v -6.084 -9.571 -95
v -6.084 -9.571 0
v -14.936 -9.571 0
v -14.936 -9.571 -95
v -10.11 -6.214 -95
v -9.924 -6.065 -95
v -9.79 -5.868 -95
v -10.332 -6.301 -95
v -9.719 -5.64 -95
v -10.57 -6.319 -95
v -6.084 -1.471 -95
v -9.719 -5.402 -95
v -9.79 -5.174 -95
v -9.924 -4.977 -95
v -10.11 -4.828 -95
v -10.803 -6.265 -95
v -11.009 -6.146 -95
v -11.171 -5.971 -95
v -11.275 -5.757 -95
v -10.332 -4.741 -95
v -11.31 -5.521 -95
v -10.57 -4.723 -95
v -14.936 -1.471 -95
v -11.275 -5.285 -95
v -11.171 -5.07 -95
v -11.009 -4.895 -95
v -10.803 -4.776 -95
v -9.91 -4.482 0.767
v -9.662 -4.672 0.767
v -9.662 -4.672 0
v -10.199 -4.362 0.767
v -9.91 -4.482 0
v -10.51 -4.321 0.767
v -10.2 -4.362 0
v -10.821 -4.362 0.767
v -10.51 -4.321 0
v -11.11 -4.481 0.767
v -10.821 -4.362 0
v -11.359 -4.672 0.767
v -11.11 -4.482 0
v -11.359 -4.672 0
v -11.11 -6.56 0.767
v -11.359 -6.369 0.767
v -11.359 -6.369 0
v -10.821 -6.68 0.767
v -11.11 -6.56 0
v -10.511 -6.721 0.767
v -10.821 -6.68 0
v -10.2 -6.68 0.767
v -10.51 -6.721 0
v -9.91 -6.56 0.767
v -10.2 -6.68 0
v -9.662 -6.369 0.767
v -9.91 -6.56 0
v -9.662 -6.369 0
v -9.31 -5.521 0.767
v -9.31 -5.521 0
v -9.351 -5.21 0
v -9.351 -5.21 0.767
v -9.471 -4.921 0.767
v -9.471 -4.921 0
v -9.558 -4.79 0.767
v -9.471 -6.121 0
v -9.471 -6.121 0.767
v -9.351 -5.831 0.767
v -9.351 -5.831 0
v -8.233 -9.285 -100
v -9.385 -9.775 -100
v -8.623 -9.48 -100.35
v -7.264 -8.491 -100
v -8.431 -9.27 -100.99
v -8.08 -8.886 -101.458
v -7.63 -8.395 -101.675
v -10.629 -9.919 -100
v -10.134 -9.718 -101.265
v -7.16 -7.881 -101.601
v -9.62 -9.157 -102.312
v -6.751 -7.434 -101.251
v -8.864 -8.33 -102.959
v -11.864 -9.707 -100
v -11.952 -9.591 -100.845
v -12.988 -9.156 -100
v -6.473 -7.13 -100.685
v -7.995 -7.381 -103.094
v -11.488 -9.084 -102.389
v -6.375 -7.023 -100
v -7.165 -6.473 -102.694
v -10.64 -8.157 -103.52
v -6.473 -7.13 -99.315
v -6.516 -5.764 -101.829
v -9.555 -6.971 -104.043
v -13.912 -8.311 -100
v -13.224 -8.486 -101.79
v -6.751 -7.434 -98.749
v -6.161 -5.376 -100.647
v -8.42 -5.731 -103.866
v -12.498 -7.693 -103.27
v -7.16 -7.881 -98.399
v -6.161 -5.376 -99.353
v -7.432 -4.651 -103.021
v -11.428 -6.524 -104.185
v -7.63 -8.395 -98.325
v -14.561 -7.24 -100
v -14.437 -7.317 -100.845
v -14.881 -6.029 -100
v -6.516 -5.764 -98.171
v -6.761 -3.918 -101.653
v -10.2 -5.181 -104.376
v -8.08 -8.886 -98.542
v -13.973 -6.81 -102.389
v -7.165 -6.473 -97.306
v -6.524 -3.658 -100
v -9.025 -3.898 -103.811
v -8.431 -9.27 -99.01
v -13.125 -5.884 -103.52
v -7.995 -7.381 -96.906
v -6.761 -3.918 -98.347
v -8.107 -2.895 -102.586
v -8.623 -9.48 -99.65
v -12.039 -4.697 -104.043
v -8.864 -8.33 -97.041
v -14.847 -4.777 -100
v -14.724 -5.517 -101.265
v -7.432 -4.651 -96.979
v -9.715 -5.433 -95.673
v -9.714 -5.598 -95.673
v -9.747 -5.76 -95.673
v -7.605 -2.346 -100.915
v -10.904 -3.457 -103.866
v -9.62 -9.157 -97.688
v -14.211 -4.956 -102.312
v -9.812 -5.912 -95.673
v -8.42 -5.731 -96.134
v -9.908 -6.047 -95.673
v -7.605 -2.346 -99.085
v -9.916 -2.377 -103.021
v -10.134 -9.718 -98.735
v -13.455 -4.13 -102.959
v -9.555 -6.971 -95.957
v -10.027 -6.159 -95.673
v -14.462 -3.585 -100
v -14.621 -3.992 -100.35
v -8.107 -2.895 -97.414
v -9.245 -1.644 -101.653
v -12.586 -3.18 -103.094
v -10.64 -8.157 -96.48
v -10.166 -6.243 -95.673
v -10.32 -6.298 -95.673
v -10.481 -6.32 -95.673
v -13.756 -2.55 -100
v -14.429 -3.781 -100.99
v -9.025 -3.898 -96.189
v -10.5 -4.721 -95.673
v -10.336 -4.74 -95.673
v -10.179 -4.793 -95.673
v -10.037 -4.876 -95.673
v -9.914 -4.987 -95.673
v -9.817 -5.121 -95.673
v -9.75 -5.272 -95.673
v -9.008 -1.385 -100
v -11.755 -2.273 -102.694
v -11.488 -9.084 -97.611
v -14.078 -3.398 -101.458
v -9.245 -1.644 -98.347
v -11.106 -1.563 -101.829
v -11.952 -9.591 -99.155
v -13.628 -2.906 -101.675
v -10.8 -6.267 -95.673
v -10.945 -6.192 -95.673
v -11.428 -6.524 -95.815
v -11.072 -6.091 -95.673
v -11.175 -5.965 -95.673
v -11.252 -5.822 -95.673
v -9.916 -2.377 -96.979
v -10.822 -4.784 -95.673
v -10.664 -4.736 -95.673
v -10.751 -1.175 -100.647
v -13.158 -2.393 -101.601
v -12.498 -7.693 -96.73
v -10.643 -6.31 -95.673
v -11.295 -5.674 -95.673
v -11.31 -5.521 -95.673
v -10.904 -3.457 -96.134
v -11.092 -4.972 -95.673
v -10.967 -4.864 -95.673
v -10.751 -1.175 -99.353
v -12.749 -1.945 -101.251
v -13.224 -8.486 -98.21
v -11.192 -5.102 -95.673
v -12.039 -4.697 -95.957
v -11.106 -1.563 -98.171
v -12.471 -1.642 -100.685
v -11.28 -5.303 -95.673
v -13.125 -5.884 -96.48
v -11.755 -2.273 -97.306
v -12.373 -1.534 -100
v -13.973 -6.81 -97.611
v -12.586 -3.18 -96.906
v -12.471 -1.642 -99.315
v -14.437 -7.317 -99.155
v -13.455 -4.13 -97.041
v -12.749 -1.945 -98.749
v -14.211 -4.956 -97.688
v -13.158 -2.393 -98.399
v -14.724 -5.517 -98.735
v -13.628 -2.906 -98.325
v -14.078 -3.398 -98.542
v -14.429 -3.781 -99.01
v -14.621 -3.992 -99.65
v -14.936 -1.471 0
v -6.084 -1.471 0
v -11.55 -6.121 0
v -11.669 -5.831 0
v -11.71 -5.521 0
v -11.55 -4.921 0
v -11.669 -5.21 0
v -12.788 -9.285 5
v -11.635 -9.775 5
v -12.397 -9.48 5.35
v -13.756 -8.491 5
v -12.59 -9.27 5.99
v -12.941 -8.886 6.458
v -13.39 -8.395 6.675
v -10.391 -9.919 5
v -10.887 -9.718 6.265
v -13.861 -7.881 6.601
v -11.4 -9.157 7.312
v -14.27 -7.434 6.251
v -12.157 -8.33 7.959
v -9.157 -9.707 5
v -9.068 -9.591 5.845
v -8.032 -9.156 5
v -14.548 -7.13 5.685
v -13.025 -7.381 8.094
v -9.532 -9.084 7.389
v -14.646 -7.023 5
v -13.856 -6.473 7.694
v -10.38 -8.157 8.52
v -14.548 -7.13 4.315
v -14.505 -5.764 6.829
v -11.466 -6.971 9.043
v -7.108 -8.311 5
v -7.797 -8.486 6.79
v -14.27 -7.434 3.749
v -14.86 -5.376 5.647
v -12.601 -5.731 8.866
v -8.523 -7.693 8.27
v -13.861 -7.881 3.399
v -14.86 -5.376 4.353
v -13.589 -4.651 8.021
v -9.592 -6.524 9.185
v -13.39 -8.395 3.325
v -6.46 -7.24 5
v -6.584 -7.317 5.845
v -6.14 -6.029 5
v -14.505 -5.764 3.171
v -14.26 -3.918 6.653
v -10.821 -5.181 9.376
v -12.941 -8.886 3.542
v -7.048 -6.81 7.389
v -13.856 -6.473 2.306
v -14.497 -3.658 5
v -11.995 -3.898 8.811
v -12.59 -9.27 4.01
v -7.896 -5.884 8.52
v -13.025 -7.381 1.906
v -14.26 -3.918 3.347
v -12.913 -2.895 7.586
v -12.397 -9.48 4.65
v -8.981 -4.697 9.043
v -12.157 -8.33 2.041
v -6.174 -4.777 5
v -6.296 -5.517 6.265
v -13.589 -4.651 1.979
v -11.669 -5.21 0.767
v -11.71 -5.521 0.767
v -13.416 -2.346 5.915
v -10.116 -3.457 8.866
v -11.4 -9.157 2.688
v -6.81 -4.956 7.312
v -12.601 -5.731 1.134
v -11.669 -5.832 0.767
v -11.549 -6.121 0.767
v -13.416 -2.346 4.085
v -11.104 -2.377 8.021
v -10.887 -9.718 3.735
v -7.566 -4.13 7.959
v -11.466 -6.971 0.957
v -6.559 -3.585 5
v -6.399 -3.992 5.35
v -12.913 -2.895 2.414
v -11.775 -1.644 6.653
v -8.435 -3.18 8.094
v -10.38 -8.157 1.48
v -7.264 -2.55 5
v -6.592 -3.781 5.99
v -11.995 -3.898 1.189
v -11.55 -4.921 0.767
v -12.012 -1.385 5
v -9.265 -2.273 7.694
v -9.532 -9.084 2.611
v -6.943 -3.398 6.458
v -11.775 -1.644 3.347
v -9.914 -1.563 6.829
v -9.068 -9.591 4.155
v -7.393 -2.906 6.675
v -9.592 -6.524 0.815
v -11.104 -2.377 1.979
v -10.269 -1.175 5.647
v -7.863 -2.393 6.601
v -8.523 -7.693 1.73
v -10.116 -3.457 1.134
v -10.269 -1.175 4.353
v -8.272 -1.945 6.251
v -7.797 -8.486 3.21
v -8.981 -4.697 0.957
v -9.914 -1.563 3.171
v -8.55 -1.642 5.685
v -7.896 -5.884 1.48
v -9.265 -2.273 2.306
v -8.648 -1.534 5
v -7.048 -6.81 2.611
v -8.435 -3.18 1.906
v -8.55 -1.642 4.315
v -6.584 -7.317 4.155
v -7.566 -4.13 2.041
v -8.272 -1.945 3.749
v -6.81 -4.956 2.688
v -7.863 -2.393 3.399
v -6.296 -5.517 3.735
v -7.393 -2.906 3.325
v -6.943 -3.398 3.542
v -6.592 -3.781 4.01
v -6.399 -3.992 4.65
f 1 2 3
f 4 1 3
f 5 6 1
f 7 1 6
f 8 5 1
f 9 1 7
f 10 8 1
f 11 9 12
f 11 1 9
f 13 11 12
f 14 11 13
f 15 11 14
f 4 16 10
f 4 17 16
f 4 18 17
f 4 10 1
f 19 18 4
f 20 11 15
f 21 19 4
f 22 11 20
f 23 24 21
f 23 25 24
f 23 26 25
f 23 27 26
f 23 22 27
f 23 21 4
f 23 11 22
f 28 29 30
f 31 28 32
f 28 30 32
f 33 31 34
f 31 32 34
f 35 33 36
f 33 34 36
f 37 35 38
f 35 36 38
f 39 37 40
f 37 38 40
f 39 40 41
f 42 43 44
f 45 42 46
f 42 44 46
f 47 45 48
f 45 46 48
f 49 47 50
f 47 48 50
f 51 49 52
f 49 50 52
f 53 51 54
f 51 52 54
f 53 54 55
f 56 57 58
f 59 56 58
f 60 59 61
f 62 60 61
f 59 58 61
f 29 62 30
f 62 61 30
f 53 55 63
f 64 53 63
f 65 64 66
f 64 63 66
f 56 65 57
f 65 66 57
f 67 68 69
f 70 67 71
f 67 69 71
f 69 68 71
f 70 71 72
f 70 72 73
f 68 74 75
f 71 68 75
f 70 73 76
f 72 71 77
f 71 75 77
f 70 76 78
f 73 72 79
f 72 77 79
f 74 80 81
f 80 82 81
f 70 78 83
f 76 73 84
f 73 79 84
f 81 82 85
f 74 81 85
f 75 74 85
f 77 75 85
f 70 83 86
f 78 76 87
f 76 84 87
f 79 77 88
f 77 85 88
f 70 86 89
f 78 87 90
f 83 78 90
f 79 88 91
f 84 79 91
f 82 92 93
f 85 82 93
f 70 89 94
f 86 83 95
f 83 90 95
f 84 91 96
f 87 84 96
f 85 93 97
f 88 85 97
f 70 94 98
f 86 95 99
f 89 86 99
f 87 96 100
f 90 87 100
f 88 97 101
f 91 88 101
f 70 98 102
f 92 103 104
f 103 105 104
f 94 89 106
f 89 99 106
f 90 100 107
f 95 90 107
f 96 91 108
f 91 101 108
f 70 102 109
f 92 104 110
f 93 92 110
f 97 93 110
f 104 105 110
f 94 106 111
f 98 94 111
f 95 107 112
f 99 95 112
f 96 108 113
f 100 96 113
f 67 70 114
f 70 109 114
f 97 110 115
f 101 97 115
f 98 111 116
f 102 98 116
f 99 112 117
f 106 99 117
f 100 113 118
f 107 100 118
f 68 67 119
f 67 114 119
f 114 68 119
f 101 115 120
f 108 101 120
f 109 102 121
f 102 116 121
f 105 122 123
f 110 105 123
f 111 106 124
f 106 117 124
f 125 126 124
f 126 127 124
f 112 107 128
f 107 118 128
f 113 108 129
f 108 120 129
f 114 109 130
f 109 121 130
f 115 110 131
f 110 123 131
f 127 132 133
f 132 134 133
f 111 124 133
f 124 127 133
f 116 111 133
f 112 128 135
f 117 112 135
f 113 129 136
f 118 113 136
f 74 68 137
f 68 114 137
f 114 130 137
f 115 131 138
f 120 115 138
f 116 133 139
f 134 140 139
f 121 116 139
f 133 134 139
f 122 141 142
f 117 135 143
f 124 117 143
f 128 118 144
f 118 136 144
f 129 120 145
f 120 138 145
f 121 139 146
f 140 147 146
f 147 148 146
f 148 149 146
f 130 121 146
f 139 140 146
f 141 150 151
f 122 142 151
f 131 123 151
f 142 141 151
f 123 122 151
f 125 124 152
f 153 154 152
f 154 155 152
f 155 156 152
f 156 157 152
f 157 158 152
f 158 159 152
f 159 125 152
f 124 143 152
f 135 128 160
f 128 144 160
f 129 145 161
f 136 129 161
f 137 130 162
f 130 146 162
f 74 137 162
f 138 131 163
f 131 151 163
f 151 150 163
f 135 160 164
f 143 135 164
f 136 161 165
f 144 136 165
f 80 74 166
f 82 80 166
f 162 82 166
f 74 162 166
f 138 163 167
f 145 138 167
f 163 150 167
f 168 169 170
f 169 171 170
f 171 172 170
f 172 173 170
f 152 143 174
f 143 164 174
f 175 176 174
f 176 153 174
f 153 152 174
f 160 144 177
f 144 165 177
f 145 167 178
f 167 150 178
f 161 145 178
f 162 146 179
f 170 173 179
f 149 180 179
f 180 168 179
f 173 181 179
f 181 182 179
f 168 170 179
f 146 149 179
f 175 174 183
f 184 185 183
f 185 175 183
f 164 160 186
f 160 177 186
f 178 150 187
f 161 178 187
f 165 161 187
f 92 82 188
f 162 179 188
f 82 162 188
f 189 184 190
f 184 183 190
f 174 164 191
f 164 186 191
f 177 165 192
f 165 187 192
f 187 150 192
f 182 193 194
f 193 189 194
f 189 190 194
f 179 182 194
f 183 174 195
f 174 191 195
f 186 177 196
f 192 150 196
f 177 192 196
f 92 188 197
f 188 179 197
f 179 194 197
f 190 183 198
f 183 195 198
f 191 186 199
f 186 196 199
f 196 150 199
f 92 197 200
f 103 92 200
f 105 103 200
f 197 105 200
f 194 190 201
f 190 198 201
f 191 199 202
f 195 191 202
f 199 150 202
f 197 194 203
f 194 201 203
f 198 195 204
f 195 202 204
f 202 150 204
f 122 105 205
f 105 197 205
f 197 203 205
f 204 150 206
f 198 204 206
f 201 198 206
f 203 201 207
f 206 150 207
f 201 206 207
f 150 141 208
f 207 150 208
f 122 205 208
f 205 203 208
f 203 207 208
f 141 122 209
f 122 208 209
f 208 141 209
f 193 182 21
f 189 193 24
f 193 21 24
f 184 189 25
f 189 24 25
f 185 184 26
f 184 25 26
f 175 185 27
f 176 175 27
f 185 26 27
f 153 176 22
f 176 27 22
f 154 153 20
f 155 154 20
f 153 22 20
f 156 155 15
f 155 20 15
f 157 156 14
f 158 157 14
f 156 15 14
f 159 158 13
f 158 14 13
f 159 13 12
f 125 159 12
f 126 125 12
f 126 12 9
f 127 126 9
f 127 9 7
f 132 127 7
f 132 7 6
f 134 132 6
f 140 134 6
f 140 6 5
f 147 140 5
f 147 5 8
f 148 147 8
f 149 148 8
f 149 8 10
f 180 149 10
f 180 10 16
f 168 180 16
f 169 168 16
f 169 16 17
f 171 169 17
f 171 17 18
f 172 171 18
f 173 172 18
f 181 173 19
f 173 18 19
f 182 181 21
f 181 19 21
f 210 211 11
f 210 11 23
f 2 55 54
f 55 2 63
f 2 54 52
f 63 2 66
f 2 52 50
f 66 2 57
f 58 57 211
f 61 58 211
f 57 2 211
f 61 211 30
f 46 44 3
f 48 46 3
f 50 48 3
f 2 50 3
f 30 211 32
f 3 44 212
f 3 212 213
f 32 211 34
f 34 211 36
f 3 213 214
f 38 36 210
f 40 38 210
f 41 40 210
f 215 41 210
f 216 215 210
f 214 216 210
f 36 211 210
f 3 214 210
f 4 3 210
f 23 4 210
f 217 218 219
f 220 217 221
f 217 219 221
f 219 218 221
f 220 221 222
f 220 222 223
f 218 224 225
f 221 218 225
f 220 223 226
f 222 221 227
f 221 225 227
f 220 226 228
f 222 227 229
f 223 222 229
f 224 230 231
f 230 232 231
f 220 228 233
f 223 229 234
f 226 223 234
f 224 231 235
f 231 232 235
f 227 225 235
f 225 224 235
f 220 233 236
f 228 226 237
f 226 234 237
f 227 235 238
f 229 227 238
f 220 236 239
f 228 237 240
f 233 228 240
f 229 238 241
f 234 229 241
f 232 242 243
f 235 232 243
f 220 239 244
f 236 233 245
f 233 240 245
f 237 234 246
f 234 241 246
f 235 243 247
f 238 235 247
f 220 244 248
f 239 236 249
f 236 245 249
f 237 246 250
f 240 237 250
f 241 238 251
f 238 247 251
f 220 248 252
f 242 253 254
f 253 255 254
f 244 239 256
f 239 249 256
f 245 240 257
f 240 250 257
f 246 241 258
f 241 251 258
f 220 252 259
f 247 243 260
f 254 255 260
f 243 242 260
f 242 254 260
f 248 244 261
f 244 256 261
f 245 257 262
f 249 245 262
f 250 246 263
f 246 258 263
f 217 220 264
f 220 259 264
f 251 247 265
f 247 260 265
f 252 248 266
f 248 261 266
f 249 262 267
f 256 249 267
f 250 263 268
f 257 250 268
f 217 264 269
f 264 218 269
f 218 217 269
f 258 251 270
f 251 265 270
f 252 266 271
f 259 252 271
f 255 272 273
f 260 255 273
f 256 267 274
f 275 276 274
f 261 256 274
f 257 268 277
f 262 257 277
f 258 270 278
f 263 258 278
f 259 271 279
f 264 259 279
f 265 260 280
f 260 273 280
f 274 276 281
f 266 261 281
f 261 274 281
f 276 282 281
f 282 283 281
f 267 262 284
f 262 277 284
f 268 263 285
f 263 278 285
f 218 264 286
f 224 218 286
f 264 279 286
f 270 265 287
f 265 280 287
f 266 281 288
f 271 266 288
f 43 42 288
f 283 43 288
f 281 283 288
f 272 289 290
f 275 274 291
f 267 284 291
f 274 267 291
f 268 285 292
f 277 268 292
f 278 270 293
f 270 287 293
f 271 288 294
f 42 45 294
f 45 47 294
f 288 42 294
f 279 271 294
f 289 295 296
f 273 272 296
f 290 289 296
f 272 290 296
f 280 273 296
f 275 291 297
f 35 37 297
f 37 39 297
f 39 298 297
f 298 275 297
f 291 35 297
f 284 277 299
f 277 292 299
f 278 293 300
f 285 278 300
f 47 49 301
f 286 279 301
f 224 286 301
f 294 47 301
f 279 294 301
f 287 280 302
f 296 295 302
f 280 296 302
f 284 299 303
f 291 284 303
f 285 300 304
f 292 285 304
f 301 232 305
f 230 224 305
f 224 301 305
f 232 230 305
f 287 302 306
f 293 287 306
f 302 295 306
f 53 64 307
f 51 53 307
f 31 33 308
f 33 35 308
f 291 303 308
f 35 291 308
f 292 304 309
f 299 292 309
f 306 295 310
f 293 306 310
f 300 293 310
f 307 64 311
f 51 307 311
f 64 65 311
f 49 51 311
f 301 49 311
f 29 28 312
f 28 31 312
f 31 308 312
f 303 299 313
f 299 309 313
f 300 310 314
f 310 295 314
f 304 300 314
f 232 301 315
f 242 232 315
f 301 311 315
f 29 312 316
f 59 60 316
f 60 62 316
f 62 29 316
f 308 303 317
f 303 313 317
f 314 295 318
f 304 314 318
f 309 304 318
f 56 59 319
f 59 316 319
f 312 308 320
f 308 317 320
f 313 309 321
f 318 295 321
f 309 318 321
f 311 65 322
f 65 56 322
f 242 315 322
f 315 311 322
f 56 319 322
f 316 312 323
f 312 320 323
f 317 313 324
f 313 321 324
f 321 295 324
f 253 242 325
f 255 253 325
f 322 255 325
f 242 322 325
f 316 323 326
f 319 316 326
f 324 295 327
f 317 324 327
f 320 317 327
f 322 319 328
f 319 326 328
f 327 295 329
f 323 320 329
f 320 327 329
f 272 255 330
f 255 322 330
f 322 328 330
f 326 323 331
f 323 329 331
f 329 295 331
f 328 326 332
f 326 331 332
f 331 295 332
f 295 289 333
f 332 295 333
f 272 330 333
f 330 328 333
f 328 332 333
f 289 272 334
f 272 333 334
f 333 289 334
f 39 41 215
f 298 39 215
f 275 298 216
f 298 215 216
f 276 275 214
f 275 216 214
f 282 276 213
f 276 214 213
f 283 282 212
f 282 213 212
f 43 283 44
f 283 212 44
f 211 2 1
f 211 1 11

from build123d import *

# Parameters (mm, degrees)
EXTRUDE_1_DEPTH = 5
SKETCH_3_W      = 8.851756477
SKETCH_3_H      = 8.100037161
EXTRUDE_2_DEPTH = 95
SKETCH_7_R      = 0.8
EXTRUDE_3_DEPTH = 5


with BuildPart() as part:
    # 草图1 → 凸台-拉伸1 (new body)
    with BuildSketch(Plane.XY):
        with BuildLine():
            ThreePointArc((-9.310291372, -5.5207396), (-9.401635933, -5.061519481), (-9.661763234, -4.672211463))
            Line((-9.661763234, -4.672211463), (-10.510291372, -5.5207396))
            Line((-10.510291372, -5.5207396), (-9.661763234, -6.369267738))
            ThreePointArc((-9.661763234, -6.369267738), (-9.401635933, -5.979959719), (-9.310291372, -5.5207396))
        make_face()
        with BuildLine():
            Line((-10.510291372, -5.5207396), (-9.661763234, -4.672211463))
            ThreePointArc((-9.661763234, -4.672211463), (-10.510291372, -4.3207396), (-11.358819509, -4.672211463))
            Line((-11.358819509, -4.672211463), (-10.510291372, -5.5207396))
        make_face()
        with BuildLine():
            Line((-9.661763234, -6.369267738), (-10.510291372, -5.5207396))
            Line((-10.510291372, -5.5207396), (-11.358819509, -6.369267738))
            ThreePointArc((-11.358819509, -6.369267738), (-10.510291372, -6.7207396), (-9.661763234, -6.369267738))
        make_face()
        with BuildLine():
            Line((-11.358819509, -6.369267738), (-10.510291372, -5.5207396))
            Line((-10.510291372, -5.5207396), (-11.358819509, -4.672211463))
            ThreePointArc((-11.358819509, -4.672211463), (-11.710291372, -5.5207396), (-11.358819509, -6.369267738))
        make_face()
    extrude(amount=EXTRUDE_1_DEPTH)

    # 草图2 → 旋转2 (revolve)
    with BuildSketch(Plane.XY.offset(5)):
        with BuildLine():
            Line((-7.264243744, -2.550356662), (-13.756338999, -8.491122538))
            ThreePointArc((-13.756338999, -8.491122538), (-7.539908434, -8.766787228), (-7.264243744, -2.550356662))
        make_face()
    revolve(axis=Axis((-7.264243744, -2.550356662, 5), (-0.737738097, -0.675087031, 0)))

    # 草图3 → 凸台-拉伸2 (add)
    with BuildSketch(Plane(origin=(0, 0, 0), x_dir=(-1, 0, 0), z_dir=(0, 0, -1))):
        with Locations((10.510291371, -5.520739601)):
            Rectangle(SKETCH_3_W, SKETCH_3_H)
    extrude(amount=EXTRUDE_2_DEPTH)

    # 草图7 → 凸台-拉伸3 (add)
    with BuildSketch(Plane(origin=(0, 0, -95), x_dir=(-1, 0, 0), z_dir=(0, 0, -1))):
        with Locations((10.510291372, -5.5207396)):
            Circle(SKETCH_7_R)
    extrude(amount=EXTRUDE_3_DEPTH)

    # 草图5 one side → 旋转4 (revolve)
    with BuildSketch(Plane(origin=(0, 0, -100), x_dir=(-1, 0, 0), z_dir=(0, 0, -1))):
        with BuildLine():
            ThreePointArc((9.920100894, -6.060809225), (10.799987435, -6.266444764), (11.310291372, -5.5207396))
            ThreePointArc((11.310291372, -5.5207396), (11.255996535, -5.231043537), (11.100481849, -4.980669975))
            Line((11.100481849, -4.980669975), (9.920100894, -6.060809225))
        make_face()
        with BuildLine():
            ThreePointArc((7.264243744, -8.491122538), (13.48067431, -8.766787228), (13.756338999, -2.550356662))
            Line((13.756338999, -2.550356662), (7.264243744, -8.491122538))
        make_face()
    revolve(axis=Axis((-13.756338999, -2.550356662, -100), (0.737738097, -0.675087031, 0)))


solid = part.part
